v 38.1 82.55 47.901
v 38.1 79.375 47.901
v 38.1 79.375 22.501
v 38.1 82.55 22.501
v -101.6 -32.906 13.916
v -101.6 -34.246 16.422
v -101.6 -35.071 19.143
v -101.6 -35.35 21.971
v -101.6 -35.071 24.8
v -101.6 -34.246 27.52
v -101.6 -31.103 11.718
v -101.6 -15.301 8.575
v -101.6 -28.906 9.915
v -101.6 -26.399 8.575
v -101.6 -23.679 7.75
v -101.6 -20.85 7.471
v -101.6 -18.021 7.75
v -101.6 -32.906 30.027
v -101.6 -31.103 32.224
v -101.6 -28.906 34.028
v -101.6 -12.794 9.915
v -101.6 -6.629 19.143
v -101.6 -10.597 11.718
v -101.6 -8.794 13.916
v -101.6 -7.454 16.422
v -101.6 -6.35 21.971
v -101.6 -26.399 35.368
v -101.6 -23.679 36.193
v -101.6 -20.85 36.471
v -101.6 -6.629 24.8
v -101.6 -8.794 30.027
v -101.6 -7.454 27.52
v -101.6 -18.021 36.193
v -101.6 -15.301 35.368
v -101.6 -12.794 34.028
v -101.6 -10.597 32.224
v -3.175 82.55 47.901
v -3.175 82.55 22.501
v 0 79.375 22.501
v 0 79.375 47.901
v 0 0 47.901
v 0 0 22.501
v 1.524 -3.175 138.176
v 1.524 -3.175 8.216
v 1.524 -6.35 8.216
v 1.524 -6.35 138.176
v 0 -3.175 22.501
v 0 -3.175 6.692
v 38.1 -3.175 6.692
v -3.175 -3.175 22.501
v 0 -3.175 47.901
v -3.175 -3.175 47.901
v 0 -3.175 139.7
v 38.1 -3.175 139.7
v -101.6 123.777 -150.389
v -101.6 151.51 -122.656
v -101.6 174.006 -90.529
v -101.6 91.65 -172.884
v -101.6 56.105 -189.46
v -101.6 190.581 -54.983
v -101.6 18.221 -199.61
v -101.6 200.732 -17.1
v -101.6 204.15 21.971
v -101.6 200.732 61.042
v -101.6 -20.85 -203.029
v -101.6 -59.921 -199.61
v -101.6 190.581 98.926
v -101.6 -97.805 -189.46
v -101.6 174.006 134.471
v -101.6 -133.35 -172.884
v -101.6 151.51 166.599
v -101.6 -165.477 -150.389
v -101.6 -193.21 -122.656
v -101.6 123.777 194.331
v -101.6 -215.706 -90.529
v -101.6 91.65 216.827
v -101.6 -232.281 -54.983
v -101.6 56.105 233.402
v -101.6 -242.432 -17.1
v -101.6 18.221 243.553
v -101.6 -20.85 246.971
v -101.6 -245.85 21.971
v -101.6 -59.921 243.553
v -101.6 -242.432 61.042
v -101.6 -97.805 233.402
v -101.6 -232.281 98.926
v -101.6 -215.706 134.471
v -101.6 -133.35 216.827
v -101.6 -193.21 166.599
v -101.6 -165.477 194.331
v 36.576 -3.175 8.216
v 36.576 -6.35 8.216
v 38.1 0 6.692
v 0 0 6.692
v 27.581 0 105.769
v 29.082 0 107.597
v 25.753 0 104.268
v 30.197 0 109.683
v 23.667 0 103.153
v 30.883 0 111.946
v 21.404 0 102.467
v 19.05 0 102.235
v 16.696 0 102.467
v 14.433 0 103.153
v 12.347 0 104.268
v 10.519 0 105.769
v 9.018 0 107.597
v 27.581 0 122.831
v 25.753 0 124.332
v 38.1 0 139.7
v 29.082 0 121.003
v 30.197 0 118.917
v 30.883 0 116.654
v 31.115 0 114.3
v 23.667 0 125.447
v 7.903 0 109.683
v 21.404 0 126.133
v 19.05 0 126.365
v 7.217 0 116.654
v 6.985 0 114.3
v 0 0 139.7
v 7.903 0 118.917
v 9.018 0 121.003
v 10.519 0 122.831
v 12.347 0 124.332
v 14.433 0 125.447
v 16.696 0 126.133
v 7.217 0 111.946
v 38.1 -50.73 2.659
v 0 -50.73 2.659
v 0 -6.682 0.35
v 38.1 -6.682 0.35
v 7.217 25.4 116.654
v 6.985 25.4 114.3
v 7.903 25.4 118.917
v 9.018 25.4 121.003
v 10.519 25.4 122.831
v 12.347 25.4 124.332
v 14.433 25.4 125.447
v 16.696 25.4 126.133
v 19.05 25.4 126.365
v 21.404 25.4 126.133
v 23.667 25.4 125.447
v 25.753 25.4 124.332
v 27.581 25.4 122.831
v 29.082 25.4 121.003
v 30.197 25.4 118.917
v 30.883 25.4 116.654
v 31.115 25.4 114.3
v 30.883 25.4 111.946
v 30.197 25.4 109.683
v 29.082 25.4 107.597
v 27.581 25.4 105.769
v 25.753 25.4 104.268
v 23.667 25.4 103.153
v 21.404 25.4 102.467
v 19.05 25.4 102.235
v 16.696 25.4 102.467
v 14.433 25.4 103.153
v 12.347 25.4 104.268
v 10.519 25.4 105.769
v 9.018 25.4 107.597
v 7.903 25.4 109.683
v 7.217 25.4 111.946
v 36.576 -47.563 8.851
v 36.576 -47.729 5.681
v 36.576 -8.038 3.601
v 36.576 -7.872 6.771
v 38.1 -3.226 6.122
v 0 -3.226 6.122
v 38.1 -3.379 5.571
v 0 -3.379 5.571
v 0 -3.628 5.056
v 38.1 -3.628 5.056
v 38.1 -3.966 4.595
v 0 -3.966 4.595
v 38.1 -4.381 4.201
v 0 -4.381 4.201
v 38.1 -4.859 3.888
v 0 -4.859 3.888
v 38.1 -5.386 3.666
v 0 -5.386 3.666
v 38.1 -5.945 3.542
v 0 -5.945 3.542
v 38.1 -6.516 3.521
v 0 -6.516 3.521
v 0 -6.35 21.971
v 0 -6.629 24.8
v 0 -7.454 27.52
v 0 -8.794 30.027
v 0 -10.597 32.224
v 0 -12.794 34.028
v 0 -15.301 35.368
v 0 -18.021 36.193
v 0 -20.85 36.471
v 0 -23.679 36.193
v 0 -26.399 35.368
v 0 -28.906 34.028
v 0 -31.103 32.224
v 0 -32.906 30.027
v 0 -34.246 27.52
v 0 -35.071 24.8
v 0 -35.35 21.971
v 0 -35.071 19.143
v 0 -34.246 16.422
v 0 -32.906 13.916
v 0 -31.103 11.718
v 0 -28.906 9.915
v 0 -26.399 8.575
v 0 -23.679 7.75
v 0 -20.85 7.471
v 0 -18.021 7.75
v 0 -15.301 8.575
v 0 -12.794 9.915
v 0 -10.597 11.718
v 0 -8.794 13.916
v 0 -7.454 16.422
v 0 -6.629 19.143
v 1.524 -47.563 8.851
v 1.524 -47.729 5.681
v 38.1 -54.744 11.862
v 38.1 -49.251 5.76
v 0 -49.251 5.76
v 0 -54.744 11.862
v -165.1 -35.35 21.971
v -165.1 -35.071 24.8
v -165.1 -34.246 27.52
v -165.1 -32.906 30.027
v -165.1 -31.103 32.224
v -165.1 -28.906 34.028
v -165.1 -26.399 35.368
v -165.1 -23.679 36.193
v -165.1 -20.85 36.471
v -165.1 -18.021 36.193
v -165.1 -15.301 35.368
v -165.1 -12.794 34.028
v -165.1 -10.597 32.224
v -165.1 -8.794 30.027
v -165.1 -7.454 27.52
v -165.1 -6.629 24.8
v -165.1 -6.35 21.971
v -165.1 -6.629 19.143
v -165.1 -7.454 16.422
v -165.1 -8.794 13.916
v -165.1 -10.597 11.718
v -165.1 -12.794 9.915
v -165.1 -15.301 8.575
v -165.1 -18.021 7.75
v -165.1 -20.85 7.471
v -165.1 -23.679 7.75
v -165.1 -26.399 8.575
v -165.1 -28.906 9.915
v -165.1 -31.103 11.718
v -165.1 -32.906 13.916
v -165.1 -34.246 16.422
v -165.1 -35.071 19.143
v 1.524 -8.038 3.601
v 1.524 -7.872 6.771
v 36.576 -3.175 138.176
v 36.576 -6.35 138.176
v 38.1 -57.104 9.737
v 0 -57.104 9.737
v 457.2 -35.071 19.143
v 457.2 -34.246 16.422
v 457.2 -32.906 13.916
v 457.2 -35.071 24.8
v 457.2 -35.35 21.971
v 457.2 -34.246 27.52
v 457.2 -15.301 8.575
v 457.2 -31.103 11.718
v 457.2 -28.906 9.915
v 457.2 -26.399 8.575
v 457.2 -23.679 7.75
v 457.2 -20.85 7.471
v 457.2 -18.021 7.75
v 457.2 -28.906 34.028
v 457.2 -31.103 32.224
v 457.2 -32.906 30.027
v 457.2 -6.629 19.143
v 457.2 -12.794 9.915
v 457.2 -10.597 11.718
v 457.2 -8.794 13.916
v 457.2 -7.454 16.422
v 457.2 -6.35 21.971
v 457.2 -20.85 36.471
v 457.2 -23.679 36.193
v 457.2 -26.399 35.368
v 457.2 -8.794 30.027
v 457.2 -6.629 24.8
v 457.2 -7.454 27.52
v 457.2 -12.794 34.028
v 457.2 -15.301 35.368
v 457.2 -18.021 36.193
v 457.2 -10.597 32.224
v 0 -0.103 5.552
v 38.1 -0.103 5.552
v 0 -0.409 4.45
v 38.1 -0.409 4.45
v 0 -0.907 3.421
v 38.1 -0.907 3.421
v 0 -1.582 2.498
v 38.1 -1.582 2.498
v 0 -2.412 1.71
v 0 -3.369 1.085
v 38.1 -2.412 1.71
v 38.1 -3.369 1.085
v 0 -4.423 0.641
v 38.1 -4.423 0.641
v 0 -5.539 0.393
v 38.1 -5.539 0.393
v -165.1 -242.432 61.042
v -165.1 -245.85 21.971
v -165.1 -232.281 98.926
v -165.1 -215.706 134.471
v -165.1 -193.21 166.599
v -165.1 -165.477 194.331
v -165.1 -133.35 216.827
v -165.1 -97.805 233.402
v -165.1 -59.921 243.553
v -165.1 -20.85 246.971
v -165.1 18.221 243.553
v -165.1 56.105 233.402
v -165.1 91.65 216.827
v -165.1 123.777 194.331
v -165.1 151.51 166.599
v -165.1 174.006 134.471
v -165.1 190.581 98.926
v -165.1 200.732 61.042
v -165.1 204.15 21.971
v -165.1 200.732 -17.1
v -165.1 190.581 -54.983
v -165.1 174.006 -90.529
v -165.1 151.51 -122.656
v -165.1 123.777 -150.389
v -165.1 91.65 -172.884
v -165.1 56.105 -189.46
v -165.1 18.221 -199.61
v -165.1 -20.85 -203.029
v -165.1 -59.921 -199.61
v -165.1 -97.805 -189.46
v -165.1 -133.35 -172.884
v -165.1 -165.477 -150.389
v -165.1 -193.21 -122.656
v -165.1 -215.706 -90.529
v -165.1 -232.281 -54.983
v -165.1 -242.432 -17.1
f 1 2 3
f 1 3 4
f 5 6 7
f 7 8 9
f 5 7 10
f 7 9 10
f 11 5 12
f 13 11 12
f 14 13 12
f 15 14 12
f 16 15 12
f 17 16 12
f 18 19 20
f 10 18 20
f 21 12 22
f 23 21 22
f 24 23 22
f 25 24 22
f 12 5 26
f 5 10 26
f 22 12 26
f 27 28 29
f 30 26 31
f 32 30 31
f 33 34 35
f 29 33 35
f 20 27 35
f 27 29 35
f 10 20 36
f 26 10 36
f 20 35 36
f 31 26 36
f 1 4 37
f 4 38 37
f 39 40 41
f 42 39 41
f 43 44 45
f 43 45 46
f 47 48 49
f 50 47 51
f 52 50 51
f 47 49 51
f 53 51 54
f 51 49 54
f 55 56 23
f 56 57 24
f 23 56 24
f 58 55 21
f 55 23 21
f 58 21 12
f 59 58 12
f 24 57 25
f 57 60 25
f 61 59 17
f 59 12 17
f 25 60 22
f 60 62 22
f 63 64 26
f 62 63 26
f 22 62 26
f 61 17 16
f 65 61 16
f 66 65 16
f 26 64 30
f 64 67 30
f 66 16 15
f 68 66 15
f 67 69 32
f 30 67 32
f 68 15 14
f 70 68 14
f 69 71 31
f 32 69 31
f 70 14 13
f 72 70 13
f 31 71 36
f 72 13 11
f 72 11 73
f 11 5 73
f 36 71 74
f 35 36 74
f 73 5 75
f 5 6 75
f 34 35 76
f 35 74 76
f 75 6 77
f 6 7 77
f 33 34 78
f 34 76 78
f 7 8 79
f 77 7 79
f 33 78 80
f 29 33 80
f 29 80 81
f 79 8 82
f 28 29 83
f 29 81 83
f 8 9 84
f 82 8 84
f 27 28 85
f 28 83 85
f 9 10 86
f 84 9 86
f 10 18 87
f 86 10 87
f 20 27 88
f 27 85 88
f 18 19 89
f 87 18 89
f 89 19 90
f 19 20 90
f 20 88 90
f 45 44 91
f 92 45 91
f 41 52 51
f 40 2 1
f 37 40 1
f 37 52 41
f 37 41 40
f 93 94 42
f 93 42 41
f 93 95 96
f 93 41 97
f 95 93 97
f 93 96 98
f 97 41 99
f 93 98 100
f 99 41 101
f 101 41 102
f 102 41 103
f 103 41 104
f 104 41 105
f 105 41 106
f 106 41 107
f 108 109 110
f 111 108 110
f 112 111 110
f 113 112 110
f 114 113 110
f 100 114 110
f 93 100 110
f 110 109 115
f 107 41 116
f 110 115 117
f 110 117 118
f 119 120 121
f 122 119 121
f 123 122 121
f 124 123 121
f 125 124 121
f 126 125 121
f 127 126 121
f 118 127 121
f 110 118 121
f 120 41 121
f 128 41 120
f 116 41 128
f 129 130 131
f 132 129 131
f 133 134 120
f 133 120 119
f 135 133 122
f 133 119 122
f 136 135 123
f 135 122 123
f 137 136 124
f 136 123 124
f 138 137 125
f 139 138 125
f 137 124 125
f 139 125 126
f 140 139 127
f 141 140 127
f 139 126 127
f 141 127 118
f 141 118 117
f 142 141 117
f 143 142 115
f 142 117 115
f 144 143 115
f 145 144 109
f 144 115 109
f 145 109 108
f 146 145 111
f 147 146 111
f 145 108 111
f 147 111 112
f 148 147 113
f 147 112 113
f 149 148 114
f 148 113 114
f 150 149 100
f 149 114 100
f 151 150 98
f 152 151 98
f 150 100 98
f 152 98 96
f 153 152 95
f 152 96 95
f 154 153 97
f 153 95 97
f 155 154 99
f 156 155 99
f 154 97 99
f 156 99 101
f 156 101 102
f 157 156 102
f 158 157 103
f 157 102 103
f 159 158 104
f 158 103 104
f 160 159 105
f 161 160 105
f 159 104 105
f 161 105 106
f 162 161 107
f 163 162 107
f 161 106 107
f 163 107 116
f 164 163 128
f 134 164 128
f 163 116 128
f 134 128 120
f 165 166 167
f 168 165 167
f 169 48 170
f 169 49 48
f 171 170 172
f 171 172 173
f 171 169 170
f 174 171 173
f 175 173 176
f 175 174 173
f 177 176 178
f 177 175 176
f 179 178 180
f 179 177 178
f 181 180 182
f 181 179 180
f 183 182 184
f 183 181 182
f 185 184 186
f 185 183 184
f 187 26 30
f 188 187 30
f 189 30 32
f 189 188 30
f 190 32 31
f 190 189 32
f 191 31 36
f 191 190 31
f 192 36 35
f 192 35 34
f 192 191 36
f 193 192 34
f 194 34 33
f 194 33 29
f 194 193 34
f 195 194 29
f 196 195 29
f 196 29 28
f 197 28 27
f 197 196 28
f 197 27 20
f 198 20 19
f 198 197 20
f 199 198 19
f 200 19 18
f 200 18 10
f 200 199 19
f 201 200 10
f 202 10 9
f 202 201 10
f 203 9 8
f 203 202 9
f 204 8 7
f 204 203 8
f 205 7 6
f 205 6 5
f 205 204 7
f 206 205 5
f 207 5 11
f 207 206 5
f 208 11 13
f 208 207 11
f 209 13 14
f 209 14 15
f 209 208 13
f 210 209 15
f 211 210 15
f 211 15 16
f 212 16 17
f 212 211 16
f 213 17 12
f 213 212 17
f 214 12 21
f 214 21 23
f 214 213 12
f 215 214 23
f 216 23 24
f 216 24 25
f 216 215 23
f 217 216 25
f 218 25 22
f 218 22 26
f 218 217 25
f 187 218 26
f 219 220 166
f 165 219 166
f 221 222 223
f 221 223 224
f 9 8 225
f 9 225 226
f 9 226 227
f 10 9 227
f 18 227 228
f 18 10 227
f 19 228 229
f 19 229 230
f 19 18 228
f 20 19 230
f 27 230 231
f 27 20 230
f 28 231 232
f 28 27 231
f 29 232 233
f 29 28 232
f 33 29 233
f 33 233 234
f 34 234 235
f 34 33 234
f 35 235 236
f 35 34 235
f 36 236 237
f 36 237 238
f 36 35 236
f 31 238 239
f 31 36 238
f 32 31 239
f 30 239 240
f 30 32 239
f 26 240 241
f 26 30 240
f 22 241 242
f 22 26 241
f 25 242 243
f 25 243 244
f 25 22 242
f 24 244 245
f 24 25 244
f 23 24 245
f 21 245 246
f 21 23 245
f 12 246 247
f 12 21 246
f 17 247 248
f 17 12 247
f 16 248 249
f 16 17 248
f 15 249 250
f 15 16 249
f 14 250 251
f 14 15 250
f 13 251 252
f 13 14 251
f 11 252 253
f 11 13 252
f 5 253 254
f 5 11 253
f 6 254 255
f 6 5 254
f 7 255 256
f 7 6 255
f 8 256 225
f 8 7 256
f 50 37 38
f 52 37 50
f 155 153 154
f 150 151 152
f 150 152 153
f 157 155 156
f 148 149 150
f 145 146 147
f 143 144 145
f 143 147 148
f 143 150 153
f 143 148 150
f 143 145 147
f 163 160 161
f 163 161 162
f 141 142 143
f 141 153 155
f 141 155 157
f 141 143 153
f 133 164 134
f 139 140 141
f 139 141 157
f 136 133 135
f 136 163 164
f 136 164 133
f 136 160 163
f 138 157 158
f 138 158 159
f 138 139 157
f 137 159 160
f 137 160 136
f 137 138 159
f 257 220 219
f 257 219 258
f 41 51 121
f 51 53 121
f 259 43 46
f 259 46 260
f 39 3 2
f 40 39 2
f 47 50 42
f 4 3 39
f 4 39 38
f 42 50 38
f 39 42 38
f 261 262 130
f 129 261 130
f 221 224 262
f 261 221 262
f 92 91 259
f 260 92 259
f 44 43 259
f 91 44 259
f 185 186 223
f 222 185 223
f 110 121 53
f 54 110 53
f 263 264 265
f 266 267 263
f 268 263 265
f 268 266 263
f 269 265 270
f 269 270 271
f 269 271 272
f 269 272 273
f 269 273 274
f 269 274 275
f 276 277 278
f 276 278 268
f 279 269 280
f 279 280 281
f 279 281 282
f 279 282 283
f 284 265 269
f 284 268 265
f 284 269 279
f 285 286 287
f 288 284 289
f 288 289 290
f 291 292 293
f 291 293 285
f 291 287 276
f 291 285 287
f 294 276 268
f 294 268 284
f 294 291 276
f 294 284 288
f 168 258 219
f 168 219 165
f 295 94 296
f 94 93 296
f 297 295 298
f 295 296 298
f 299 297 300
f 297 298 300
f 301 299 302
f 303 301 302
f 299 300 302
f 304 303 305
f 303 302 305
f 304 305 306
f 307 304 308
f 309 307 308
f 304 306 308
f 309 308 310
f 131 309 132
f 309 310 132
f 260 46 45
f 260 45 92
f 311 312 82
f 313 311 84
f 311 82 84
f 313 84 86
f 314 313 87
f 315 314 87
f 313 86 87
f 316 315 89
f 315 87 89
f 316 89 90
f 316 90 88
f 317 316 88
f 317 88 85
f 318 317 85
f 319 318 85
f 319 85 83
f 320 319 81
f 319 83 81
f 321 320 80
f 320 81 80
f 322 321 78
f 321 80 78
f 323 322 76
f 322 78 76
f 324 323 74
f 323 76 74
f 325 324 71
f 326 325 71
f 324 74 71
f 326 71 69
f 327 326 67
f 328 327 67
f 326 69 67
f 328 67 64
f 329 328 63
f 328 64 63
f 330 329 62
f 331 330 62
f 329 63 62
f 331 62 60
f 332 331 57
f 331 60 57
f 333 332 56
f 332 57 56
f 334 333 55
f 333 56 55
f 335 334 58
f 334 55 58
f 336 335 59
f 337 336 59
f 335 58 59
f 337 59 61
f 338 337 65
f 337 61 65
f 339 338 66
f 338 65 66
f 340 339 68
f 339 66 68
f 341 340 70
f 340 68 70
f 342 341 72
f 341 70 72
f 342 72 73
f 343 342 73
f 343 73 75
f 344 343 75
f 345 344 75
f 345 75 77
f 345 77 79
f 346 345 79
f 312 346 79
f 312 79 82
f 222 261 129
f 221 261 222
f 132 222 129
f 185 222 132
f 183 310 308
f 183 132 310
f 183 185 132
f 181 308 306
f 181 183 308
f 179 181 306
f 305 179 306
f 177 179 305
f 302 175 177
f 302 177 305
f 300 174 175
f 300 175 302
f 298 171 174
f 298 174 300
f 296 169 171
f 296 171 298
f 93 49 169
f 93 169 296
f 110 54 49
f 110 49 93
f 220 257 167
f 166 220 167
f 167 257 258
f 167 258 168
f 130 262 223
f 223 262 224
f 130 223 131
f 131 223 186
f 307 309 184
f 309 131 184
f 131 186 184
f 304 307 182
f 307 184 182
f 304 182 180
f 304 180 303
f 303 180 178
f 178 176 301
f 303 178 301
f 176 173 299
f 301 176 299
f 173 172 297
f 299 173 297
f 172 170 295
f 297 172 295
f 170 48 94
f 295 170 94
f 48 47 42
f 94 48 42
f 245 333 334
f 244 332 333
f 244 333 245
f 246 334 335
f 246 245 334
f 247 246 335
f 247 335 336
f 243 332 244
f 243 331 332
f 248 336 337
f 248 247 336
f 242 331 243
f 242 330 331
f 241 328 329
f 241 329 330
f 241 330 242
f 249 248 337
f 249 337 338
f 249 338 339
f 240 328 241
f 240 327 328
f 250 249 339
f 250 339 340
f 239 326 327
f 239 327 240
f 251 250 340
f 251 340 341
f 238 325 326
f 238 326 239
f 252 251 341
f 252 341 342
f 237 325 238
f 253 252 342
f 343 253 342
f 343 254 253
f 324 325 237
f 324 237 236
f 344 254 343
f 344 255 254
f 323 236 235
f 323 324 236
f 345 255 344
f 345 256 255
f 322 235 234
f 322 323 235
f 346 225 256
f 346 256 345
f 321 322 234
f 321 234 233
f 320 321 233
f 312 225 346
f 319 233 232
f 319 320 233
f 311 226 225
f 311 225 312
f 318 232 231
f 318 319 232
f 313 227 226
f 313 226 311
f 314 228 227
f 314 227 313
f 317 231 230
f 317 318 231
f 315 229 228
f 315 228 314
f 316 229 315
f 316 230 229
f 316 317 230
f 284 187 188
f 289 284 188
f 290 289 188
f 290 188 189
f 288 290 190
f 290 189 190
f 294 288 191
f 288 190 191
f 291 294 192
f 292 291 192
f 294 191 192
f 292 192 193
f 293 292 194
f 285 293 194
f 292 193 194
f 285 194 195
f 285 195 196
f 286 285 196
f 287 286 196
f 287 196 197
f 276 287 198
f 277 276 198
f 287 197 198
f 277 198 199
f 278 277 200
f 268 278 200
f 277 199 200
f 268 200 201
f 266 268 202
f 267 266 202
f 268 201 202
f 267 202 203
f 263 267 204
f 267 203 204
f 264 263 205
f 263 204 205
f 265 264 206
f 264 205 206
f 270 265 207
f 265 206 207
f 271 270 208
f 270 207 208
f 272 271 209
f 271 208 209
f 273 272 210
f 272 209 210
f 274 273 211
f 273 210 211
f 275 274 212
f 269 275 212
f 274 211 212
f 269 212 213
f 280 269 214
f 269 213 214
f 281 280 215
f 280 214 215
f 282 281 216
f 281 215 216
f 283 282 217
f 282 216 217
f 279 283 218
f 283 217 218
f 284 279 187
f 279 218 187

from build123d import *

# Parameters (mm, degrees)
F1_DEPTH       = 38.1
F2_R           = 3.175
F3_R           = 6.35
F4_W           = 85.725
F4_H           = 25.4
F5_DEPTH       = 3.175
F6_W           = 3.175
F6_H           = 25.4
F7_DEPTH       = 38.1
F8_R           = 12.065
F9_DEPTH       = 25.4
F10_W          = 35.052
F10_H          = 129.9604962045
F11_DEPTH      = 3.175
F12_W          = 35.052
F12_H          = 39.7453681439
F13_DEPTH      = 3.175
F14_R          = 14.5
F15_DEPTH      = 101.6
F15_DEPTH_BACK = 457.2
F16_R          = 225
F16_R_2        = 14.5
F17_DEPTH      = 63.5


with BuildPart() as f1:
    # F0 (on Right) → F1 (new body)
    with BuildSketch(Plane.YZ):
        Polygon((-50.7303803655, 2.6586665771), (0, 0), (0, 139.7), (-3.175, 139.7), (-3.175, 3.3457518978), (-49.2508879812, 5.7604868654), (-54.7443645702, 11.861610715), (-57.1038493911, 9.7371210398), align=None)
    extrude(amount=F1_DEPTH)

    # F2
    f2_edges = [f1.edges().sort_by_distance(p)[0] for p in [
        (19.05, -3.175, 3.345752),
    ]]
    fillet(f2_edges, radius=F2_R)

    # F3
    f3_edges = [f1.edges().sort_by_distance(p)[0] for p in [
        (19.05, 0, 0),
    ]]
    fillet(f3_edges, radius=F3_R)

    # F4 (on face) → F5 (join)
    with BuildSketch(Plane(origin=(0, 0, 0), x_dir=(0, -1, 0), z_dir=(-1, 0, 0))):
        with Locations((-39.6875, 35.2008372217)):
            Rectangle(F4_W, F4_H)
    extrude(amount=F5_DEPTH)

    # F6 (on face) → F7 (join)
    with BuildSketch(Plane.YZ):
        with Locations((80.9625, 35.2008372217)):
            Rectangle(F6_W, F6_H)
    extrude(amount=F7_DEPTH)

    # F8 (on face) → F9 (join)
    with BuildSketch(Plane(origin=(0, 0, 0), x_dir=(-1, 0, 0), z_dir=(0, 1, 0))):
        with Locations((-19.05, 114.3)):
            Circle(F8_R)
    extrude(amount=F9_DEPTH)


with BuildPart() as f11:
    # F10 (on face) → F11 (new body)
    with BuildSketch(Plane.XZ.offset(3.175)):
        with Locations((19.05, 73.1957518978)):
            Rectangle(F10_W, F10_H)
    extrude(amount=F11_DEPTH)


with BuildPart() as f13:
    # F12 (on face) → F13 (new body)
    with BuildSketch(Plane(origin=(0, 0.1661666611, 3.1706487728), x_dir=(1, 0, 0), z_dir=(0, 0.0523359562, 0.9986295348))):
        with Locations((19.05, -28.0881878675)):
            Rectangle(F12_W, F12_H)
    extrude(amount=F13_DEPTH)


with BuildPart() as f15:
    # F14 (on Right) → F15 (new body, two sides)
    with BuildSketch(Plane.YZ) as f15_sk:
        with Locations((-20.85, 21.9713156121)):
            Circle(F14_R)
    extrude(amount=-F15_DEPTH)
    extrude(f15_sk.sketch, amount=F15_DEPTH_BACK)


with BuildPart() as f17:
    # F16 (on face) → F17 (new body)
    with BuildSketch(Plane(origin=(-101.6, 0, 0), x_dir=(0, -1, 0), z_dir=(-1, 0, 0))):
        with Locations((20.85, 21.9713156121)):
            Circle(F16_R)
        with Locations((20.85, 21.9713156121)):
            Circle(F16_R_2, mode=Mode.SUBTRACT)
    extrude(amount=F17_DEPTH)


solid = Compound([f1.part, f11.part, f13.part, f15.part, f17.part])
